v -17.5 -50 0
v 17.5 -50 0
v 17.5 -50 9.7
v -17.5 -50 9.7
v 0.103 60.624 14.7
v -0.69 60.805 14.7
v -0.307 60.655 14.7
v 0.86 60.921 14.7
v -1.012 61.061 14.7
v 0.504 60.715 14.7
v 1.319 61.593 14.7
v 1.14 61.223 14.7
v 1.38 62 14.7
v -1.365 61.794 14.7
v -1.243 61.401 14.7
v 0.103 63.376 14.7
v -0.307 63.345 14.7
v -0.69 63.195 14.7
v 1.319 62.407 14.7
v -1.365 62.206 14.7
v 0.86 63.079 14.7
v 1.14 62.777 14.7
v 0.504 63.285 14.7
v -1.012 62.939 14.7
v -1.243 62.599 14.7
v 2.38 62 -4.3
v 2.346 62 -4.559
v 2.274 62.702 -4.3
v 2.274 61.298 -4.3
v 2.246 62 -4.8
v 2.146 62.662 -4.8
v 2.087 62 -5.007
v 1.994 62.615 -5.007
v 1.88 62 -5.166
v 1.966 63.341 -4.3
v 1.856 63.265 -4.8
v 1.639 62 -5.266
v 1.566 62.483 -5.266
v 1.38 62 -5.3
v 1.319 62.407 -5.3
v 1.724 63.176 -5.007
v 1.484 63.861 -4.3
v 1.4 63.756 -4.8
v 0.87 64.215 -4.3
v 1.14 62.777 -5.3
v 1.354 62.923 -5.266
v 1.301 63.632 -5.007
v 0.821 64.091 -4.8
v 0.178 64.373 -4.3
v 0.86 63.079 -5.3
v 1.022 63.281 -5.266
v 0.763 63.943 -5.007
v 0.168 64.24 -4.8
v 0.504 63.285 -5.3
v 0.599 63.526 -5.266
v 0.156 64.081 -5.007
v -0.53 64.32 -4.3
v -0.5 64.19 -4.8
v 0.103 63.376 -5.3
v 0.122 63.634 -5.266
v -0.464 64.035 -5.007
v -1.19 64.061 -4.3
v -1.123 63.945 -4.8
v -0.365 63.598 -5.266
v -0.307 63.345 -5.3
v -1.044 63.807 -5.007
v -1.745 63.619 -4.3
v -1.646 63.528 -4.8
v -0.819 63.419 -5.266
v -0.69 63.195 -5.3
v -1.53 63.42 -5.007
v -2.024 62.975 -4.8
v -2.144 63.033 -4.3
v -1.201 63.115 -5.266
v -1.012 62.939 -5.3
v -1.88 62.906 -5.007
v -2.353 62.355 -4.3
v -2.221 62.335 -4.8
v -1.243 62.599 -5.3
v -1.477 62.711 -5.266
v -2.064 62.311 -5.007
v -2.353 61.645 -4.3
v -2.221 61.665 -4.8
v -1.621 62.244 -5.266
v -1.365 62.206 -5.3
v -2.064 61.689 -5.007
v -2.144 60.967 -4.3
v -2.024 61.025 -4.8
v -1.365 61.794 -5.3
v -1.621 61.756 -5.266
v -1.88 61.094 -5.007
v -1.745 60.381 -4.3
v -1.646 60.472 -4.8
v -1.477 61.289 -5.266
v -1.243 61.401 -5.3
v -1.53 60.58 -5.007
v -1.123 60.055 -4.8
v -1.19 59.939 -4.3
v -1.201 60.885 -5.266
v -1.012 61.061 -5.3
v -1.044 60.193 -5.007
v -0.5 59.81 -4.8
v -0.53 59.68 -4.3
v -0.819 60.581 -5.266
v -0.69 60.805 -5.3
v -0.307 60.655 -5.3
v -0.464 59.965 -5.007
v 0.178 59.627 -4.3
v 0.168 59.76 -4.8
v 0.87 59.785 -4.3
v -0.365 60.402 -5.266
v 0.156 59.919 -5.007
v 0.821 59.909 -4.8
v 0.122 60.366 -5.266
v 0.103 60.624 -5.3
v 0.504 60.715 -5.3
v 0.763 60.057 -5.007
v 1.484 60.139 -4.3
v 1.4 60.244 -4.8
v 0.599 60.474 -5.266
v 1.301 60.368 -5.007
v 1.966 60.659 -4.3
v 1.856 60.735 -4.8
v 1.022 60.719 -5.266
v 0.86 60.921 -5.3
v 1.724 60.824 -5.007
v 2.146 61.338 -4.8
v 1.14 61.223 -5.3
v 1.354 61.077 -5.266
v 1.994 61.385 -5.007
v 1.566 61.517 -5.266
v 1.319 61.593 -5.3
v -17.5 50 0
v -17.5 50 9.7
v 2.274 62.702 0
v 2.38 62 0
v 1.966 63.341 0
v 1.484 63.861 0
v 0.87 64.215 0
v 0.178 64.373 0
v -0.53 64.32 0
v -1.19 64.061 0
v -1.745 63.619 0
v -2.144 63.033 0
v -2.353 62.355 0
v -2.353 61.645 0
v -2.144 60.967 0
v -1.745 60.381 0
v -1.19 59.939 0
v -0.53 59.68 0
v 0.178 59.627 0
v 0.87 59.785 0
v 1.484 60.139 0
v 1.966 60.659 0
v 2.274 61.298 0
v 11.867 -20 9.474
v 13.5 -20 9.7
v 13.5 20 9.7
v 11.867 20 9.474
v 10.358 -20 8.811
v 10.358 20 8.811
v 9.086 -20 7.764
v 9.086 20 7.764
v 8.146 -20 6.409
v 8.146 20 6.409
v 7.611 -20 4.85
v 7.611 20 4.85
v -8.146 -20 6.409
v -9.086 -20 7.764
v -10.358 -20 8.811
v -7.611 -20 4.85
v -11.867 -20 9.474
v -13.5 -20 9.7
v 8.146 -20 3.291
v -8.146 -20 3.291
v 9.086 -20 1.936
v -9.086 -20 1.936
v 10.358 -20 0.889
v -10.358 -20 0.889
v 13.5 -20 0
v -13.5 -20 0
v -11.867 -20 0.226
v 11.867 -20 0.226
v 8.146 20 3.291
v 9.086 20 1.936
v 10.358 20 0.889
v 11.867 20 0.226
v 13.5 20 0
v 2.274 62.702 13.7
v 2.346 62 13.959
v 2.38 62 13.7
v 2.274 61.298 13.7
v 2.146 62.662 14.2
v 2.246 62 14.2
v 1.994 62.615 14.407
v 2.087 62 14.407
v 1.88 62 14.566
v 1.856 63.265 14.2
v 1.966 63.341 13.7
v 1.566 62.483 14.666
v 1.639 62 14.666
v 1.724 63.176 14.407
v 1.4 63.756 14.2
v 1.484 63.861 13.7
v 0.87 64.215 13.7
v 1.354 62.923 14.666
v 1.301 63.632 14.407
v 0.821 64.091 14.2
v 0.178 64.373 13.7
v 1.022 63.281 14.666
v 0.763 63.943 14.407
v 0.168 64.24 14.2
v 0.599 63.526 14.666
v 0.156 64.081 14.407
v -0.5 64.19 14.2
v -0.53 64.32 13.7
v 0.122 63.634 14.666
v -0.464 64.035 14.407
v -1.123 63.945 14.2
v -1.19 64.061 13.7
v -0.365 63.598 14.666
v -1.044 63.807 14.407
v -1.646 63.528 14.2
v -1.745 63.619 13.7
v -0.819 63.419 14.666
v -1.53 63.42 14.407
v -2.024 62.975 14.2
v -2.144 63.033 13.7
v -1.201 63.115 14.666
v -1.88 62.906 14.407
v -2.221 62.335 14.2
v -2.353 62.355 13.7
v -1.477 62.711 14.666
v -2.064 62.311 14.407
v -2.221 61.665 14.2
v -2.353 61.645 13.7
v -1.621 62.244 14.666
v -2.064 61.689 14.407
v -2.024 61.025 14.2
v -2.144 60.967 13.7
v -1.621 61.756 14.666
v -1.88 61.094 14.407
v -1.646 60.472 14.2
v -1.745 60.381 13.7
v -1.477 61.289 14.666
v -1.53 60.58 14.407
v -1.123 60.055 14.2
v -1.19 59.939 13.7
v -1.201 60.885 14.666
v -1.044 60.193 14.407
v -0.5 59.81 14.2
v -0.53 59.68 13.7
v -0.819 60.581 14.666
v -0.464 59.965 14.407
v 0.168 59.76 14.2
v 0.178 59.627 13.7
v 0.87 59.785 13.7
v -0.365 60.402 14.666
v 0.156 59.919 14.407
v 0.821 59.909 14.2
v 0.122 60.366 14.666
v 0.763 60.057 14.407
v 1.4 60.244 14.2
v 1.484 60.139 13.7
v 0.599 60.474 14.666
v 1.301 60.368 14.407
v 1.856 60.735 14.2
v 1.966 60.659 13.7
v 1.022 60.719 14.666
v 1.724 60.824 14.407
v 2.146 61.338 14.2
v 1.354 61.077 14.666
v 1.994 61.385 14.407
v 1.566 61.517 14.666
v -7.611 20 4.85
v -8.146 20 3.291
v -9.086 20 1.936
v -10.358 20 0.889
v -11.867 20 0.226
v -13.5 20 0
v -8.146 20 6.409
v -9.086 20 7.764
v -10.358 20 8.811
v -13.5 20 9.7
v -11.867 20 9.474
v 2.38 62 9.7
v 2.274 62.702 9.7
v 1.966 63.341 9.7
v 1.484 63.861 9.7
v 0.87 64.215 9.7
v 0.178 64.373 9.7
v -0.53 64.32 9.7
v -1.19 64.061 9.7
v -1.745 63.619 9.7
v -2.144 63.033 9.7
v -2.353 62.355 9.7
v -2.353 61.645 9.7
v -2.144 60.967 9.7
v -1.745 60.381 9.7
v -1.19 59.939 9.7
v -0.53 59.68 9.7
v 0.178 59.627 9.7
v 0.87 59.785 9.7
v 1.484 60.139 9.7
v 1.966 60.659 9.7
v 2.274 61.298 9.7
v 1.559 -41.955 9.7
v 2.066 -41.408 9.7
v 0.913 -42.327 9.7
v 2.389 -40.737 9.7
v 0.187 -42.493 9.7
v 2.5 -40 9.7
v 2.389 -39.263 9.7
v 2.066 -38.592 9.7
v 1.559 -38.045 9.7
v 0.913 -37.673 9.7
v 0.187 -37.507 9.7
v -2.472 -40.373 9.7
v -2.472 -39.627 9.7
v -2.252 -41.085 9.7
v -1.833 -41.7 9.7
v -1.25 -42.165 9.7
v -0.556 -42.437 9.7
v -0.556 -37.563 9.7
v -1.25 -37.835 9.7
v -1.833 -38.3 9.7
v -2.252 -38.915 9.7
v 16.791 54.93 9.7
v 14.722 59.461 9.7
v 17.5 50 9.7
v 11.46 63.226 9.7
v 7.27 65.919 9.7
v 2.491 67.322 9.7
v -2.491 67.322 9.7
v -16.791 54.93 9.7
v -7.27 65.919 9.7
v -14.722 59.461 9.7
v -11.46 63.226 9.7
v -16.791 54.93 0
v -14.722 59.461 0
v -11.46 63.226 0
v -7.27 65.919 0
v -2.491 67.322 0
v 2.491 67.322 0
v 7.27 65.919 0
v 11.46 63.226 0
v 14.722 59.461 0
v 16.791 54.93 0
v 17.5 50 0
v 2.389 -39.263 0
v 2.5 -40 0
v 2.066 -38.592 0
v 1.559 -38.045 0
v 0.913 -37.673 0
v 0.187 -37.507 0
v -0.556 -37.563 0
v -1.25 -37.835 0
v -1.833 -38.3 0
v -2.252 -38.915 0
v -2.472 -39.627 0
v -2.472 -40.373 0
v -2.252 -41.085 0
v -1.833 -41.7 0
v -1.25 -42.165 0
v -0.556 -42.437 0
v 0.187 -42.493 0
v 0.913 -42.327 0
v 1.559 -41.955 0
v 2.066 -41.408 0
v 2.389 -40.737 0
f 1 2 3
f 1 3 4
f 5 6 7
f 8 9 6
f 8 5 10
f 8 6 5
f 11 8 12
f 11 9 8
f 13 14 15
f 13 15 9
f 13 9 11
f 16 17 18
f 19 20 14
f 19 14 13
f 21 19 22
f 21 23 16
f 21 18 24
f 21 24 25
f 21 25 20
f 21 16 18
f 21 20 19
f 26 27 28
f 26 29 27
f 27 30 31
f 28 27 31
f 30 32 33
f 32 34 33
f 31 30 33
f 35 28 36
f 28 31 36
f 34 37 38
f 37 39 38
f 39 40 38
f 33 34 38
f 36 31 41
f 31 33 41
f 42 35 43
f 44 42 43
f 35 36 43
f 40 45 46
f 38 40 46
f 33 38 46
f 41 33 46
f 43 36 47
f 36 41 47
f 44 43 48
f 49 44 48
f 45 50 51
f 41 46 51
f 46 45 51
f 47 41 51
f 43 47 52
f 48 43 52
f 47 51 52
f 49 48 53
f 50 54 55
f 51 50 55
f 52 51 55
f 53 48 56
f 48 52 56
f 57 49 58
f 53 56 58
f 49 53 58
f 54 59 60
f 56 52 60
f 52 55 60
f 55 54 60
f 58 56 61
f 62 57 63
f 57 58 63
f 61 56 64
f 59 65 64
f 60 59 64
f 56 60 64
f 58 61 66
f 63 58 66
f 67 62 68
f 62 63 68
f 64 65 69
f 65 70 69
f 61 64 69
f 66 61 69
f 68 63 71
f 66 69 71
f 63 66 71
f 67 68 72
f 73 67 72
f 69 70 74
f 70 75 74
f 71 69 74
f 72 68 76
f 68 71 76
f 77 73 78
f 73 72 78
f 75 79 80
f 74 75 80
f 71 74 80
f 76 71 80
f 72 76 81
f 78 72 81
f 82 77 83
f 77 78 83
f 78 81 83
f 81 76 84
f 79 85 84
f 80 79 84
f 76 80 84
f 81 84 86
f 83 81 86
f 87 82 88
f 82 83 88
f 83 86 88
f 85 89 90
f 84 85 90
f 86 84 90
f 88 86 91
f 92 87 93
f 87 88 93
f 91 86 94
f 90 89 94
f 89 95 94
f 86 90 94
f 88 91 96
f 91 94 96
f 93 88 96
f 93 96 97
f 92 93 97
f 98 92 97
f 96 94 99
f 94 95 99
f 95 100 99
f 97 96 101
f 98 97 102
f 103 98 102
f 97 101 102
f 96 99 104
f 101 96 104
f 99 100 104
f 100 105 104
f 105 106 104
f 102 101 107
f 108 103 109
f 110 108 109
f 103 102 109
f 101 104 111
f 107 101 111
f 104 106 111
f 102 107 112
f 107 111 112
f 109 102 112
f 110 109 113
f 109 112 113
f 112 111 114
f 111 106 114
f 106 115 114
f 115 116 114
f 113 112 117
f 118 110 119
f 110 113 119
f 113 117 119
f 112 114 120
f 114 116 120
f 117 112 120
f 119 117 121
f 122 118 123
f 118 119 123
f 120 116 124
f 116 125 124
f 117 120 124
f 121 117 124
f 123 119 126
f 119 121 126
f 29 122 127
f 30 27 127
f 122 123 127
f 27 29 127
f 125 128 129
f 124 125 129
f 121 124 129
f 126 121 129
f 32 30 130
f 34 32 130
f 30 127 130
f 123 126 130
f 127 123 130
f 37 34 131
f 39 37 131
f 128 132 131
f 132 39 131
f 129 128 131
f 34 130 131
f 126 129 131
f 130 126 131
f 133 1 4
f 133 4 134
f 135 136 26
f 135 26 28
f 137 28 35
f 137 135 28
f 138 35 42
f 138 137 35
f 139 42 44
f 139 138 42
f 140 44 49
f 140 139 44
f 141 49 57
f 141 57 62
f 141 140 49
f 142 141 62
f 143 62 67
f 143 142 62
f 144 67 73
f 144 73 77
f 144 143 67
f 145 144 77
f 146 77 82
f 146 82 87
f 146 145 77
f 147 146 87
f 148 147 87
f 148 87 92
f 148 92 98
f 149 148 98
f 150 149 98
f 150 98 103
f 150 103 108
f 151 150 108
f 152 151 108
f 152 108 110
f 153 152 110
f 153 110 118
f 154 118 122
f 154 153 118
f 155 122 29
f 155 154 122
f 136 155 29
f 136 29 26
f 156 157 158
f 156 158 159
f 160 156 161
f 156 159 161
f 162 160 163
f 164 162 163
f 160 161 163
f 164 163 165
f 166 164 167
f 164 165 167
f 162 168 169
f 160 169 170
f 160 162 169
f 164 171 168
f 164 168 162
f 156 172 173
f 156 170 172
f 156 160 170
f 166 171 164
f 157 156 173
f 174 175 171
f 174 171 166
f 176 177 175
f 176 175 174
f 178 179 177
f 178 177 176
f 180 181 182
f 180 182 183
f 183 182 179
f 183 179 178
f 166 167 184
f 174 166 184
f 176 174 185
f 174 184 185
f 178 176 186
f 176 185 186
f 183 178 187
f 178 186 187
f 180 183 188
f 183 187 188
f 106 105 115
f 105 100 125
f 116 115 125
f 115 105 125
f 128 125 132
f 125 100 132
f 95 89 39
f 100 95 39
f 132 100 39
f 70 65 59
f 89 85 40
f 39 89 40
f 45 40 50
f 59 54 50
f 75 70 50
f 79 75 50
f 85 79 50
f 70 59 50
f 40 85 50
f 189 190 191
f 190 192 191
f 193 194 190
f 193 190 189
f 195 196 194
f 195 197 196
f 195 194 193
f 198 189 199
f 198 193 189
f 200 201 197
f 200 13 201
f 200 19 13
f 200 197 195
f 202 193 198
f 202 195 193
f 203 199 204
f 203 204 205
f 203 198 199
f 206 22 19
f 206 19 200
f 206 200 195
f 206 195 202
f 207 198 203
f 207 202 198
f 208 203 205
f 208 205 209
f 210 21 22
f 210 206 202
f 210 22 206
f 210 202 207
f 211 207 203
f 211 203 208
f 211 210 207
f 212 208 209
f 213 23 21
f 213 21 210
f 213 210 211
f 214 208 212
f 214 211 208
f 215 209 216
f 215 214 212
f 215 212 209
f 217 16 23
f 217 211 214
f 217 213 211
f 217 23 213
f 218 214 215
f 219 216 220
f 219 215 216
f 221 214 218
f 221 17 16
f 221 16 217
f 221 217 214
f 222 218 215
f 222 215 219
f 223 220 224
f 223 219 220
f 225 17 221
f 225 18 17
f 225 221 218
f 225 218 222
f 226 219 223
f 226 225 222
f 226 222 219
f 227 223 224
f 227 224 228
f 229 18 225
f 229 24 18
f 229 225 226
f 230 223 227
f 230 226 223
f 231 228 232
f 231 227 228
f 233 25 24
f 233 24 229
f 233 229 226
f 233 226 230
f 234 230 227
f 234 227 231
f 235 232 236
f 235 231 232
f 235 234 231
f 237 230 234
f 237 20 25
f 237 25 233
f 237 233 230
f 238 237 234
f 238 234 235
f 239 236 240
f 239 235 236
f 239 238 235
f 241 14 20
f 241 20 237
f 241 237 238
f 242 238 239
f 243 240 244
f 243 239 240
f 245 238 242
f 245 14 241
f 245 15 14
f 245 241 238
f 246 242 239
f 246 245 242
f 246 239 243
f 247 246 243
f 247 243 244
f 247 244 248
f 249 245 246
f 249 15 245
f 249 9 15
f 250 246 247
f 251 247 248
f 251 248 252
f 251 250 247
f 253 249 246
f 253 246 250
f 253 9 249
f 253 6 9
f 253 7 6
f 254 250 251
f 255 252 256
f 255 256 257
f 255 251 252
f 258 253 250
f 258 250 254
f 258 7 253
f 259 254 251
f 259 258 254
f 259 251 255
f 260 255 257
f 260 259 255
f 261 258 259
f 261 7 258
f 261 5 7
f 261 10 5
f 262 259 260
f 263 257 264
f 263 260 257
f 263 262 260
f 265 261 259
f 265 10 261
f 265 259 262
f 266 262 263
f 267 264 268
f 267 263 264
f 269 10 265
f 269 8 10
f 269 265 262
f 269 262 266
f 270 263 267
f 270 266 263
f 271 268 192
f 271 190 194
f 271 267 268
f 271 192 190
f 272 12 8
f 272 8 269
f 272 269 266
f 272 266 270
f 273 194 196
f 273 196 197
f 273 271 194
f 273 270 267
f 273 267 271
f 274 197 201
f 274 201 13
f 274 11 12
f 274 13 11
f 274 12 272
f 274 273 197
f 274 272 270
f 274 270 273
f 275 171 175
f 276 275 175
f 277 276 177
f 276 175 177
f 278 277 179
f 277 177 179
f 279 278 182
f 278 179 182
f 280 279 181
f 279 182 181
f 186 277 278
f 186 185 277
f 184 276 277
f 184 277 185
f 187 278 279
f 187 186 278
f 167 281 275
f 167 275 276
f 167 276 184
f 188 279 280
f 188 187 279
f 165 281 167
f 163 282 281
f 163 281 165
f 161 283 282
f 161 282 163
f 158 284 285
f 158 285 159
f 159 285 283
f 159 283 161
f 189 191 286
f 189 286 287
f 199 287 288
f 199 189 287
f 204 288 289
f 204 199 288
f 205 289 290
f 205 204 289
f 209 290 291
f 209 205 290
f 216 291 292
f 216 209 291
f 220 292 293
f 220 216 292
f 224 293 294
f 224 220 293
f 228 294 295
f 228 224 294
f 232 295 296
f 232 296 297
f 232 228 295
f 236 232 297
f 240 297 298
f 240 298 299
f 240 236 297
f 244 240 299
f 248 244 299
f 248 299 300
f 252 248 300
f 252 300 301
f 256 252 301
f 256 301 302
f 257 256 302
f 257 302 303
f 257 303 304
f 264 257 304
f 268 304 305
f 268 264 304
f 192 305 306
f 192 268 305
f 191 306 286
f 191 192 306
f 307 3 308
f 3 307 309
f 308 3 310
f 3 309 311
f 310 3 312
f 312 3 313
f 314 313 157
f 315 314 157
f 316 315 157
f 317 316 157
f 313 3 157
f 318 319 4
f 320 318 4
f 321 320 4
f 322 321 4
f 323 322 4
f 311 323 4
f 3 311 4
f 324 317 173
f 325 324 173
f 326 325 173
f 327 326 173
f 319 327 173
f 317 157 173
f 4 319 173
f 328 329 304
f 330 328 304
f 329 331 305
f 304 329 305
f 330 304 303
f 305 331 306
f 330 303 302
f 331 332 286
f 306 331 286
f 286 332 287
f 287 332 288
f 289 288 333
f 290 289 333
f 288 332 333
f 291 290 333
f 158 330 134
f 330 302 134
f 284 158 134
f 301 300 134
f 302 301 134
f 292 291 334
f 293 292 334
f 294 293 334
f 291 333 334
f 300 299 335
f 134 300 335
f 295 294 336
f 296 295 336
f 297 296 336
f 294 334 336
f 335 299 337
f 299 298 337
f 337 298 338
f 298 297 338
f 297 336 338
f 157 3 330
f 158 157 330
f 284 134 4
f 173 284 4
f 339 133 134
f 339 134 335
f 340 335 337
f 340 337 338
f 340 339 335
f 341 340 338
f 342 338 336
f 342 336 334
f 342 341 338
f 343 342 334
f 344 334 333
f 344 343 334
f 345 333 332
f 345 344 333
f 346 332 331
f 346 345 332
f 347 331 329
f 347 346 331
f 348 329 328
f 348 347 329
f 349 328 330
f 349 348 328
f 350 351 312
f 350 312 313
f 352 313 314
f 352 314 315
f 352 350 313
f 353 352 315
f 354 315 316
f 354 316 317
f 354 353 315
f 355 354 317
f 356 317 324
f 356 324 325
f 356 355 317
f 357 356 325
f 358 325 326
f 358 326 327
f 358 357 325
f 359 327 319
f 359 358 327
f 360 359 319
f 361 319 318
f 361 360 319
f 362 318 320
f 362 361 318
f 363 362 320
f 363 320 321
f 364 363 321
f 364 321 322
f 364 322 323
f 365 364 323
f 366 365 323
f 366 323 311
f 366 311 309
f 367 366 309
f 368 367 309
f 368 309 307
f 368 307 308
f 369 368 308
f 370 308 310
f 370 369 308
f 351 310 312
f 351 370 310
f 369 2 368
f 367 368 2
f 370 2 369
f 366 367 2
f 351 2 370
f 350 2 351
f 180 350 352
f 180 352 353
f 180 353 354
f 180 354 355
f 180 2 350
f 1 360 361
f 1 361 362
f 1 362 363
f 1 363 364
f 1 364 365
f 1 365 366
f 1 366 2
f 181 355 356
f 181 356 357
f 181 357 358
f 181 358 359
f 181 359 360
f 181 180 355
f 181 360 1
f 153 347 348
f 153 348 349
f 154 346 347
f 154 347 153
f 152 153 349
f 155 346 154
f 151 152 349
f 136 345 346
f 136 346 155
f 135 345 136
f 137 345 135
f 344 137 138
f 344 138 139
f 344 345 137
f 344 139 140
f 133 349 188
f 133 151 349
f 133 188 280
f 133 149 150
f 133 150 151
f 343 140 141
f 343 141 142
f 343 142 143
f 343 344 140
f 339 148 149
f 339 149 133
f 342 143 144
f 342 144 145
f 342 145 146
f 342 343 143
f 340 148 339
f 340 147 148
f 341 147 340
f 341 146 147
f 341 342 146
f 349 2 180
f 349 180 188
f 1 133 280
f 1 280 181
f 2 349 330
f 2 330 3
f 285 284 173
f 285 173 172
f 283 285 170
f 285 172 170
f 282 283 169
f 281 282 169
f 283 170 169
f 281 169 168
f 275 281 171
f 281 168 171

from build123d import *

# Parameters (mm, degrees)
SKETCH1_R           = 2.5
SKETCH1_W           = 15
SKETCH1_H           = 40
BOSS_EXTRUDE1_DEPTH = 9.7
BOSS_EXTRUDE2_START = -5
SKETCH2_R           = 2.38
BOSS_EXTRUDE2_DEPTH = 10
FILLET1_R           = 1
FILLET2_R           = 6


with BuildPart() as part:
    # Sketch1 → Boss-Extrude1 (new body)
    # profile 1 of 2: a face of its own
    with BuildSketch(Plane.XY):
        with BuildLine():
            ThreePointArc((-17.5, 50), (0, 67.5), (17.5, 50))
            Line((17.5, 50), (17.5, -50))
            Line((17.5, -50), (-17.5, -50))
            Line((-17.5, -50), (-17.5, 50))
        make_face()
        with Locations((0, -40)):
            Circle(SKETCH1_R, mode=Mode.SUBTRACT)
        Rectangle(SKETCH1_W, SKETCH1_H, mode=Mode.SUBTRACT)
    # profile 2 of 2: a face of its own
    with BuildSketch(Plane.XY):
        with BuildLine():
            ThreePointArc((-17.5, 50), (0, 67.5), (17.5, 50))
            Line((17.5, 50), (-17.5, 50))
        make_face()
    extrude(amount=BOSS_EXTRUDE1_DEPTH)

    # Sketch2 → Boss-Extrude2 (add, symmetric)
    with BuildSketch(Plane.XY.offset(9.7).offset(BOSS_EXTRUDE2_START)):
        with Locations((0, 62)):
            Circle(SKETCH2_R)
    extrude(amount=BOSS_EXTRUDE2_DEPTH, both=True)

    # Fillet1
    fillet1_edges = [part.edges().sort_by_distance(p)[0] for p in [
        (-2.38, 62, -5.3),
        (-2.38, 62, 14.7),
    ]]
    fillet(fillet1_edges, radius=FILLET1_R)

    # Fillet2
    # the kernel refuses this fillet: 6 mm, written as the material it takes off along each edge
    with BuildSketch(Plane(origin=(7.5, 20, 0), x_dir=(1, 0, 0), z_dir=(0, -1, 0)), Plane(origin=(7.5, 20, 9.7), x_dir=(0, 0, -1), z_dir=(0, -1, 0)), Plane(origin=(-7.5, -20, 0), x_dir=(-1, 0, 0), z_dir=(0, 1, 0)), Plane(origin=(-7.5, -20, 9.7), x_dir=(0, 0, -1), z_dir=(0, 1, 0))) as fillet2_piece_1:
        with BuildLine():
            CenterArc((FILLET2_R, FILLET2_R), FILLET2_R, 180, 90)
            Line((0, FILLET2_R), (0, 0))
            Line((0, 0), (FILLET2_R, 0))
        make_face()
    extrude(amount=40, mode=Mode.SUBTRACT)


solid = part.part
